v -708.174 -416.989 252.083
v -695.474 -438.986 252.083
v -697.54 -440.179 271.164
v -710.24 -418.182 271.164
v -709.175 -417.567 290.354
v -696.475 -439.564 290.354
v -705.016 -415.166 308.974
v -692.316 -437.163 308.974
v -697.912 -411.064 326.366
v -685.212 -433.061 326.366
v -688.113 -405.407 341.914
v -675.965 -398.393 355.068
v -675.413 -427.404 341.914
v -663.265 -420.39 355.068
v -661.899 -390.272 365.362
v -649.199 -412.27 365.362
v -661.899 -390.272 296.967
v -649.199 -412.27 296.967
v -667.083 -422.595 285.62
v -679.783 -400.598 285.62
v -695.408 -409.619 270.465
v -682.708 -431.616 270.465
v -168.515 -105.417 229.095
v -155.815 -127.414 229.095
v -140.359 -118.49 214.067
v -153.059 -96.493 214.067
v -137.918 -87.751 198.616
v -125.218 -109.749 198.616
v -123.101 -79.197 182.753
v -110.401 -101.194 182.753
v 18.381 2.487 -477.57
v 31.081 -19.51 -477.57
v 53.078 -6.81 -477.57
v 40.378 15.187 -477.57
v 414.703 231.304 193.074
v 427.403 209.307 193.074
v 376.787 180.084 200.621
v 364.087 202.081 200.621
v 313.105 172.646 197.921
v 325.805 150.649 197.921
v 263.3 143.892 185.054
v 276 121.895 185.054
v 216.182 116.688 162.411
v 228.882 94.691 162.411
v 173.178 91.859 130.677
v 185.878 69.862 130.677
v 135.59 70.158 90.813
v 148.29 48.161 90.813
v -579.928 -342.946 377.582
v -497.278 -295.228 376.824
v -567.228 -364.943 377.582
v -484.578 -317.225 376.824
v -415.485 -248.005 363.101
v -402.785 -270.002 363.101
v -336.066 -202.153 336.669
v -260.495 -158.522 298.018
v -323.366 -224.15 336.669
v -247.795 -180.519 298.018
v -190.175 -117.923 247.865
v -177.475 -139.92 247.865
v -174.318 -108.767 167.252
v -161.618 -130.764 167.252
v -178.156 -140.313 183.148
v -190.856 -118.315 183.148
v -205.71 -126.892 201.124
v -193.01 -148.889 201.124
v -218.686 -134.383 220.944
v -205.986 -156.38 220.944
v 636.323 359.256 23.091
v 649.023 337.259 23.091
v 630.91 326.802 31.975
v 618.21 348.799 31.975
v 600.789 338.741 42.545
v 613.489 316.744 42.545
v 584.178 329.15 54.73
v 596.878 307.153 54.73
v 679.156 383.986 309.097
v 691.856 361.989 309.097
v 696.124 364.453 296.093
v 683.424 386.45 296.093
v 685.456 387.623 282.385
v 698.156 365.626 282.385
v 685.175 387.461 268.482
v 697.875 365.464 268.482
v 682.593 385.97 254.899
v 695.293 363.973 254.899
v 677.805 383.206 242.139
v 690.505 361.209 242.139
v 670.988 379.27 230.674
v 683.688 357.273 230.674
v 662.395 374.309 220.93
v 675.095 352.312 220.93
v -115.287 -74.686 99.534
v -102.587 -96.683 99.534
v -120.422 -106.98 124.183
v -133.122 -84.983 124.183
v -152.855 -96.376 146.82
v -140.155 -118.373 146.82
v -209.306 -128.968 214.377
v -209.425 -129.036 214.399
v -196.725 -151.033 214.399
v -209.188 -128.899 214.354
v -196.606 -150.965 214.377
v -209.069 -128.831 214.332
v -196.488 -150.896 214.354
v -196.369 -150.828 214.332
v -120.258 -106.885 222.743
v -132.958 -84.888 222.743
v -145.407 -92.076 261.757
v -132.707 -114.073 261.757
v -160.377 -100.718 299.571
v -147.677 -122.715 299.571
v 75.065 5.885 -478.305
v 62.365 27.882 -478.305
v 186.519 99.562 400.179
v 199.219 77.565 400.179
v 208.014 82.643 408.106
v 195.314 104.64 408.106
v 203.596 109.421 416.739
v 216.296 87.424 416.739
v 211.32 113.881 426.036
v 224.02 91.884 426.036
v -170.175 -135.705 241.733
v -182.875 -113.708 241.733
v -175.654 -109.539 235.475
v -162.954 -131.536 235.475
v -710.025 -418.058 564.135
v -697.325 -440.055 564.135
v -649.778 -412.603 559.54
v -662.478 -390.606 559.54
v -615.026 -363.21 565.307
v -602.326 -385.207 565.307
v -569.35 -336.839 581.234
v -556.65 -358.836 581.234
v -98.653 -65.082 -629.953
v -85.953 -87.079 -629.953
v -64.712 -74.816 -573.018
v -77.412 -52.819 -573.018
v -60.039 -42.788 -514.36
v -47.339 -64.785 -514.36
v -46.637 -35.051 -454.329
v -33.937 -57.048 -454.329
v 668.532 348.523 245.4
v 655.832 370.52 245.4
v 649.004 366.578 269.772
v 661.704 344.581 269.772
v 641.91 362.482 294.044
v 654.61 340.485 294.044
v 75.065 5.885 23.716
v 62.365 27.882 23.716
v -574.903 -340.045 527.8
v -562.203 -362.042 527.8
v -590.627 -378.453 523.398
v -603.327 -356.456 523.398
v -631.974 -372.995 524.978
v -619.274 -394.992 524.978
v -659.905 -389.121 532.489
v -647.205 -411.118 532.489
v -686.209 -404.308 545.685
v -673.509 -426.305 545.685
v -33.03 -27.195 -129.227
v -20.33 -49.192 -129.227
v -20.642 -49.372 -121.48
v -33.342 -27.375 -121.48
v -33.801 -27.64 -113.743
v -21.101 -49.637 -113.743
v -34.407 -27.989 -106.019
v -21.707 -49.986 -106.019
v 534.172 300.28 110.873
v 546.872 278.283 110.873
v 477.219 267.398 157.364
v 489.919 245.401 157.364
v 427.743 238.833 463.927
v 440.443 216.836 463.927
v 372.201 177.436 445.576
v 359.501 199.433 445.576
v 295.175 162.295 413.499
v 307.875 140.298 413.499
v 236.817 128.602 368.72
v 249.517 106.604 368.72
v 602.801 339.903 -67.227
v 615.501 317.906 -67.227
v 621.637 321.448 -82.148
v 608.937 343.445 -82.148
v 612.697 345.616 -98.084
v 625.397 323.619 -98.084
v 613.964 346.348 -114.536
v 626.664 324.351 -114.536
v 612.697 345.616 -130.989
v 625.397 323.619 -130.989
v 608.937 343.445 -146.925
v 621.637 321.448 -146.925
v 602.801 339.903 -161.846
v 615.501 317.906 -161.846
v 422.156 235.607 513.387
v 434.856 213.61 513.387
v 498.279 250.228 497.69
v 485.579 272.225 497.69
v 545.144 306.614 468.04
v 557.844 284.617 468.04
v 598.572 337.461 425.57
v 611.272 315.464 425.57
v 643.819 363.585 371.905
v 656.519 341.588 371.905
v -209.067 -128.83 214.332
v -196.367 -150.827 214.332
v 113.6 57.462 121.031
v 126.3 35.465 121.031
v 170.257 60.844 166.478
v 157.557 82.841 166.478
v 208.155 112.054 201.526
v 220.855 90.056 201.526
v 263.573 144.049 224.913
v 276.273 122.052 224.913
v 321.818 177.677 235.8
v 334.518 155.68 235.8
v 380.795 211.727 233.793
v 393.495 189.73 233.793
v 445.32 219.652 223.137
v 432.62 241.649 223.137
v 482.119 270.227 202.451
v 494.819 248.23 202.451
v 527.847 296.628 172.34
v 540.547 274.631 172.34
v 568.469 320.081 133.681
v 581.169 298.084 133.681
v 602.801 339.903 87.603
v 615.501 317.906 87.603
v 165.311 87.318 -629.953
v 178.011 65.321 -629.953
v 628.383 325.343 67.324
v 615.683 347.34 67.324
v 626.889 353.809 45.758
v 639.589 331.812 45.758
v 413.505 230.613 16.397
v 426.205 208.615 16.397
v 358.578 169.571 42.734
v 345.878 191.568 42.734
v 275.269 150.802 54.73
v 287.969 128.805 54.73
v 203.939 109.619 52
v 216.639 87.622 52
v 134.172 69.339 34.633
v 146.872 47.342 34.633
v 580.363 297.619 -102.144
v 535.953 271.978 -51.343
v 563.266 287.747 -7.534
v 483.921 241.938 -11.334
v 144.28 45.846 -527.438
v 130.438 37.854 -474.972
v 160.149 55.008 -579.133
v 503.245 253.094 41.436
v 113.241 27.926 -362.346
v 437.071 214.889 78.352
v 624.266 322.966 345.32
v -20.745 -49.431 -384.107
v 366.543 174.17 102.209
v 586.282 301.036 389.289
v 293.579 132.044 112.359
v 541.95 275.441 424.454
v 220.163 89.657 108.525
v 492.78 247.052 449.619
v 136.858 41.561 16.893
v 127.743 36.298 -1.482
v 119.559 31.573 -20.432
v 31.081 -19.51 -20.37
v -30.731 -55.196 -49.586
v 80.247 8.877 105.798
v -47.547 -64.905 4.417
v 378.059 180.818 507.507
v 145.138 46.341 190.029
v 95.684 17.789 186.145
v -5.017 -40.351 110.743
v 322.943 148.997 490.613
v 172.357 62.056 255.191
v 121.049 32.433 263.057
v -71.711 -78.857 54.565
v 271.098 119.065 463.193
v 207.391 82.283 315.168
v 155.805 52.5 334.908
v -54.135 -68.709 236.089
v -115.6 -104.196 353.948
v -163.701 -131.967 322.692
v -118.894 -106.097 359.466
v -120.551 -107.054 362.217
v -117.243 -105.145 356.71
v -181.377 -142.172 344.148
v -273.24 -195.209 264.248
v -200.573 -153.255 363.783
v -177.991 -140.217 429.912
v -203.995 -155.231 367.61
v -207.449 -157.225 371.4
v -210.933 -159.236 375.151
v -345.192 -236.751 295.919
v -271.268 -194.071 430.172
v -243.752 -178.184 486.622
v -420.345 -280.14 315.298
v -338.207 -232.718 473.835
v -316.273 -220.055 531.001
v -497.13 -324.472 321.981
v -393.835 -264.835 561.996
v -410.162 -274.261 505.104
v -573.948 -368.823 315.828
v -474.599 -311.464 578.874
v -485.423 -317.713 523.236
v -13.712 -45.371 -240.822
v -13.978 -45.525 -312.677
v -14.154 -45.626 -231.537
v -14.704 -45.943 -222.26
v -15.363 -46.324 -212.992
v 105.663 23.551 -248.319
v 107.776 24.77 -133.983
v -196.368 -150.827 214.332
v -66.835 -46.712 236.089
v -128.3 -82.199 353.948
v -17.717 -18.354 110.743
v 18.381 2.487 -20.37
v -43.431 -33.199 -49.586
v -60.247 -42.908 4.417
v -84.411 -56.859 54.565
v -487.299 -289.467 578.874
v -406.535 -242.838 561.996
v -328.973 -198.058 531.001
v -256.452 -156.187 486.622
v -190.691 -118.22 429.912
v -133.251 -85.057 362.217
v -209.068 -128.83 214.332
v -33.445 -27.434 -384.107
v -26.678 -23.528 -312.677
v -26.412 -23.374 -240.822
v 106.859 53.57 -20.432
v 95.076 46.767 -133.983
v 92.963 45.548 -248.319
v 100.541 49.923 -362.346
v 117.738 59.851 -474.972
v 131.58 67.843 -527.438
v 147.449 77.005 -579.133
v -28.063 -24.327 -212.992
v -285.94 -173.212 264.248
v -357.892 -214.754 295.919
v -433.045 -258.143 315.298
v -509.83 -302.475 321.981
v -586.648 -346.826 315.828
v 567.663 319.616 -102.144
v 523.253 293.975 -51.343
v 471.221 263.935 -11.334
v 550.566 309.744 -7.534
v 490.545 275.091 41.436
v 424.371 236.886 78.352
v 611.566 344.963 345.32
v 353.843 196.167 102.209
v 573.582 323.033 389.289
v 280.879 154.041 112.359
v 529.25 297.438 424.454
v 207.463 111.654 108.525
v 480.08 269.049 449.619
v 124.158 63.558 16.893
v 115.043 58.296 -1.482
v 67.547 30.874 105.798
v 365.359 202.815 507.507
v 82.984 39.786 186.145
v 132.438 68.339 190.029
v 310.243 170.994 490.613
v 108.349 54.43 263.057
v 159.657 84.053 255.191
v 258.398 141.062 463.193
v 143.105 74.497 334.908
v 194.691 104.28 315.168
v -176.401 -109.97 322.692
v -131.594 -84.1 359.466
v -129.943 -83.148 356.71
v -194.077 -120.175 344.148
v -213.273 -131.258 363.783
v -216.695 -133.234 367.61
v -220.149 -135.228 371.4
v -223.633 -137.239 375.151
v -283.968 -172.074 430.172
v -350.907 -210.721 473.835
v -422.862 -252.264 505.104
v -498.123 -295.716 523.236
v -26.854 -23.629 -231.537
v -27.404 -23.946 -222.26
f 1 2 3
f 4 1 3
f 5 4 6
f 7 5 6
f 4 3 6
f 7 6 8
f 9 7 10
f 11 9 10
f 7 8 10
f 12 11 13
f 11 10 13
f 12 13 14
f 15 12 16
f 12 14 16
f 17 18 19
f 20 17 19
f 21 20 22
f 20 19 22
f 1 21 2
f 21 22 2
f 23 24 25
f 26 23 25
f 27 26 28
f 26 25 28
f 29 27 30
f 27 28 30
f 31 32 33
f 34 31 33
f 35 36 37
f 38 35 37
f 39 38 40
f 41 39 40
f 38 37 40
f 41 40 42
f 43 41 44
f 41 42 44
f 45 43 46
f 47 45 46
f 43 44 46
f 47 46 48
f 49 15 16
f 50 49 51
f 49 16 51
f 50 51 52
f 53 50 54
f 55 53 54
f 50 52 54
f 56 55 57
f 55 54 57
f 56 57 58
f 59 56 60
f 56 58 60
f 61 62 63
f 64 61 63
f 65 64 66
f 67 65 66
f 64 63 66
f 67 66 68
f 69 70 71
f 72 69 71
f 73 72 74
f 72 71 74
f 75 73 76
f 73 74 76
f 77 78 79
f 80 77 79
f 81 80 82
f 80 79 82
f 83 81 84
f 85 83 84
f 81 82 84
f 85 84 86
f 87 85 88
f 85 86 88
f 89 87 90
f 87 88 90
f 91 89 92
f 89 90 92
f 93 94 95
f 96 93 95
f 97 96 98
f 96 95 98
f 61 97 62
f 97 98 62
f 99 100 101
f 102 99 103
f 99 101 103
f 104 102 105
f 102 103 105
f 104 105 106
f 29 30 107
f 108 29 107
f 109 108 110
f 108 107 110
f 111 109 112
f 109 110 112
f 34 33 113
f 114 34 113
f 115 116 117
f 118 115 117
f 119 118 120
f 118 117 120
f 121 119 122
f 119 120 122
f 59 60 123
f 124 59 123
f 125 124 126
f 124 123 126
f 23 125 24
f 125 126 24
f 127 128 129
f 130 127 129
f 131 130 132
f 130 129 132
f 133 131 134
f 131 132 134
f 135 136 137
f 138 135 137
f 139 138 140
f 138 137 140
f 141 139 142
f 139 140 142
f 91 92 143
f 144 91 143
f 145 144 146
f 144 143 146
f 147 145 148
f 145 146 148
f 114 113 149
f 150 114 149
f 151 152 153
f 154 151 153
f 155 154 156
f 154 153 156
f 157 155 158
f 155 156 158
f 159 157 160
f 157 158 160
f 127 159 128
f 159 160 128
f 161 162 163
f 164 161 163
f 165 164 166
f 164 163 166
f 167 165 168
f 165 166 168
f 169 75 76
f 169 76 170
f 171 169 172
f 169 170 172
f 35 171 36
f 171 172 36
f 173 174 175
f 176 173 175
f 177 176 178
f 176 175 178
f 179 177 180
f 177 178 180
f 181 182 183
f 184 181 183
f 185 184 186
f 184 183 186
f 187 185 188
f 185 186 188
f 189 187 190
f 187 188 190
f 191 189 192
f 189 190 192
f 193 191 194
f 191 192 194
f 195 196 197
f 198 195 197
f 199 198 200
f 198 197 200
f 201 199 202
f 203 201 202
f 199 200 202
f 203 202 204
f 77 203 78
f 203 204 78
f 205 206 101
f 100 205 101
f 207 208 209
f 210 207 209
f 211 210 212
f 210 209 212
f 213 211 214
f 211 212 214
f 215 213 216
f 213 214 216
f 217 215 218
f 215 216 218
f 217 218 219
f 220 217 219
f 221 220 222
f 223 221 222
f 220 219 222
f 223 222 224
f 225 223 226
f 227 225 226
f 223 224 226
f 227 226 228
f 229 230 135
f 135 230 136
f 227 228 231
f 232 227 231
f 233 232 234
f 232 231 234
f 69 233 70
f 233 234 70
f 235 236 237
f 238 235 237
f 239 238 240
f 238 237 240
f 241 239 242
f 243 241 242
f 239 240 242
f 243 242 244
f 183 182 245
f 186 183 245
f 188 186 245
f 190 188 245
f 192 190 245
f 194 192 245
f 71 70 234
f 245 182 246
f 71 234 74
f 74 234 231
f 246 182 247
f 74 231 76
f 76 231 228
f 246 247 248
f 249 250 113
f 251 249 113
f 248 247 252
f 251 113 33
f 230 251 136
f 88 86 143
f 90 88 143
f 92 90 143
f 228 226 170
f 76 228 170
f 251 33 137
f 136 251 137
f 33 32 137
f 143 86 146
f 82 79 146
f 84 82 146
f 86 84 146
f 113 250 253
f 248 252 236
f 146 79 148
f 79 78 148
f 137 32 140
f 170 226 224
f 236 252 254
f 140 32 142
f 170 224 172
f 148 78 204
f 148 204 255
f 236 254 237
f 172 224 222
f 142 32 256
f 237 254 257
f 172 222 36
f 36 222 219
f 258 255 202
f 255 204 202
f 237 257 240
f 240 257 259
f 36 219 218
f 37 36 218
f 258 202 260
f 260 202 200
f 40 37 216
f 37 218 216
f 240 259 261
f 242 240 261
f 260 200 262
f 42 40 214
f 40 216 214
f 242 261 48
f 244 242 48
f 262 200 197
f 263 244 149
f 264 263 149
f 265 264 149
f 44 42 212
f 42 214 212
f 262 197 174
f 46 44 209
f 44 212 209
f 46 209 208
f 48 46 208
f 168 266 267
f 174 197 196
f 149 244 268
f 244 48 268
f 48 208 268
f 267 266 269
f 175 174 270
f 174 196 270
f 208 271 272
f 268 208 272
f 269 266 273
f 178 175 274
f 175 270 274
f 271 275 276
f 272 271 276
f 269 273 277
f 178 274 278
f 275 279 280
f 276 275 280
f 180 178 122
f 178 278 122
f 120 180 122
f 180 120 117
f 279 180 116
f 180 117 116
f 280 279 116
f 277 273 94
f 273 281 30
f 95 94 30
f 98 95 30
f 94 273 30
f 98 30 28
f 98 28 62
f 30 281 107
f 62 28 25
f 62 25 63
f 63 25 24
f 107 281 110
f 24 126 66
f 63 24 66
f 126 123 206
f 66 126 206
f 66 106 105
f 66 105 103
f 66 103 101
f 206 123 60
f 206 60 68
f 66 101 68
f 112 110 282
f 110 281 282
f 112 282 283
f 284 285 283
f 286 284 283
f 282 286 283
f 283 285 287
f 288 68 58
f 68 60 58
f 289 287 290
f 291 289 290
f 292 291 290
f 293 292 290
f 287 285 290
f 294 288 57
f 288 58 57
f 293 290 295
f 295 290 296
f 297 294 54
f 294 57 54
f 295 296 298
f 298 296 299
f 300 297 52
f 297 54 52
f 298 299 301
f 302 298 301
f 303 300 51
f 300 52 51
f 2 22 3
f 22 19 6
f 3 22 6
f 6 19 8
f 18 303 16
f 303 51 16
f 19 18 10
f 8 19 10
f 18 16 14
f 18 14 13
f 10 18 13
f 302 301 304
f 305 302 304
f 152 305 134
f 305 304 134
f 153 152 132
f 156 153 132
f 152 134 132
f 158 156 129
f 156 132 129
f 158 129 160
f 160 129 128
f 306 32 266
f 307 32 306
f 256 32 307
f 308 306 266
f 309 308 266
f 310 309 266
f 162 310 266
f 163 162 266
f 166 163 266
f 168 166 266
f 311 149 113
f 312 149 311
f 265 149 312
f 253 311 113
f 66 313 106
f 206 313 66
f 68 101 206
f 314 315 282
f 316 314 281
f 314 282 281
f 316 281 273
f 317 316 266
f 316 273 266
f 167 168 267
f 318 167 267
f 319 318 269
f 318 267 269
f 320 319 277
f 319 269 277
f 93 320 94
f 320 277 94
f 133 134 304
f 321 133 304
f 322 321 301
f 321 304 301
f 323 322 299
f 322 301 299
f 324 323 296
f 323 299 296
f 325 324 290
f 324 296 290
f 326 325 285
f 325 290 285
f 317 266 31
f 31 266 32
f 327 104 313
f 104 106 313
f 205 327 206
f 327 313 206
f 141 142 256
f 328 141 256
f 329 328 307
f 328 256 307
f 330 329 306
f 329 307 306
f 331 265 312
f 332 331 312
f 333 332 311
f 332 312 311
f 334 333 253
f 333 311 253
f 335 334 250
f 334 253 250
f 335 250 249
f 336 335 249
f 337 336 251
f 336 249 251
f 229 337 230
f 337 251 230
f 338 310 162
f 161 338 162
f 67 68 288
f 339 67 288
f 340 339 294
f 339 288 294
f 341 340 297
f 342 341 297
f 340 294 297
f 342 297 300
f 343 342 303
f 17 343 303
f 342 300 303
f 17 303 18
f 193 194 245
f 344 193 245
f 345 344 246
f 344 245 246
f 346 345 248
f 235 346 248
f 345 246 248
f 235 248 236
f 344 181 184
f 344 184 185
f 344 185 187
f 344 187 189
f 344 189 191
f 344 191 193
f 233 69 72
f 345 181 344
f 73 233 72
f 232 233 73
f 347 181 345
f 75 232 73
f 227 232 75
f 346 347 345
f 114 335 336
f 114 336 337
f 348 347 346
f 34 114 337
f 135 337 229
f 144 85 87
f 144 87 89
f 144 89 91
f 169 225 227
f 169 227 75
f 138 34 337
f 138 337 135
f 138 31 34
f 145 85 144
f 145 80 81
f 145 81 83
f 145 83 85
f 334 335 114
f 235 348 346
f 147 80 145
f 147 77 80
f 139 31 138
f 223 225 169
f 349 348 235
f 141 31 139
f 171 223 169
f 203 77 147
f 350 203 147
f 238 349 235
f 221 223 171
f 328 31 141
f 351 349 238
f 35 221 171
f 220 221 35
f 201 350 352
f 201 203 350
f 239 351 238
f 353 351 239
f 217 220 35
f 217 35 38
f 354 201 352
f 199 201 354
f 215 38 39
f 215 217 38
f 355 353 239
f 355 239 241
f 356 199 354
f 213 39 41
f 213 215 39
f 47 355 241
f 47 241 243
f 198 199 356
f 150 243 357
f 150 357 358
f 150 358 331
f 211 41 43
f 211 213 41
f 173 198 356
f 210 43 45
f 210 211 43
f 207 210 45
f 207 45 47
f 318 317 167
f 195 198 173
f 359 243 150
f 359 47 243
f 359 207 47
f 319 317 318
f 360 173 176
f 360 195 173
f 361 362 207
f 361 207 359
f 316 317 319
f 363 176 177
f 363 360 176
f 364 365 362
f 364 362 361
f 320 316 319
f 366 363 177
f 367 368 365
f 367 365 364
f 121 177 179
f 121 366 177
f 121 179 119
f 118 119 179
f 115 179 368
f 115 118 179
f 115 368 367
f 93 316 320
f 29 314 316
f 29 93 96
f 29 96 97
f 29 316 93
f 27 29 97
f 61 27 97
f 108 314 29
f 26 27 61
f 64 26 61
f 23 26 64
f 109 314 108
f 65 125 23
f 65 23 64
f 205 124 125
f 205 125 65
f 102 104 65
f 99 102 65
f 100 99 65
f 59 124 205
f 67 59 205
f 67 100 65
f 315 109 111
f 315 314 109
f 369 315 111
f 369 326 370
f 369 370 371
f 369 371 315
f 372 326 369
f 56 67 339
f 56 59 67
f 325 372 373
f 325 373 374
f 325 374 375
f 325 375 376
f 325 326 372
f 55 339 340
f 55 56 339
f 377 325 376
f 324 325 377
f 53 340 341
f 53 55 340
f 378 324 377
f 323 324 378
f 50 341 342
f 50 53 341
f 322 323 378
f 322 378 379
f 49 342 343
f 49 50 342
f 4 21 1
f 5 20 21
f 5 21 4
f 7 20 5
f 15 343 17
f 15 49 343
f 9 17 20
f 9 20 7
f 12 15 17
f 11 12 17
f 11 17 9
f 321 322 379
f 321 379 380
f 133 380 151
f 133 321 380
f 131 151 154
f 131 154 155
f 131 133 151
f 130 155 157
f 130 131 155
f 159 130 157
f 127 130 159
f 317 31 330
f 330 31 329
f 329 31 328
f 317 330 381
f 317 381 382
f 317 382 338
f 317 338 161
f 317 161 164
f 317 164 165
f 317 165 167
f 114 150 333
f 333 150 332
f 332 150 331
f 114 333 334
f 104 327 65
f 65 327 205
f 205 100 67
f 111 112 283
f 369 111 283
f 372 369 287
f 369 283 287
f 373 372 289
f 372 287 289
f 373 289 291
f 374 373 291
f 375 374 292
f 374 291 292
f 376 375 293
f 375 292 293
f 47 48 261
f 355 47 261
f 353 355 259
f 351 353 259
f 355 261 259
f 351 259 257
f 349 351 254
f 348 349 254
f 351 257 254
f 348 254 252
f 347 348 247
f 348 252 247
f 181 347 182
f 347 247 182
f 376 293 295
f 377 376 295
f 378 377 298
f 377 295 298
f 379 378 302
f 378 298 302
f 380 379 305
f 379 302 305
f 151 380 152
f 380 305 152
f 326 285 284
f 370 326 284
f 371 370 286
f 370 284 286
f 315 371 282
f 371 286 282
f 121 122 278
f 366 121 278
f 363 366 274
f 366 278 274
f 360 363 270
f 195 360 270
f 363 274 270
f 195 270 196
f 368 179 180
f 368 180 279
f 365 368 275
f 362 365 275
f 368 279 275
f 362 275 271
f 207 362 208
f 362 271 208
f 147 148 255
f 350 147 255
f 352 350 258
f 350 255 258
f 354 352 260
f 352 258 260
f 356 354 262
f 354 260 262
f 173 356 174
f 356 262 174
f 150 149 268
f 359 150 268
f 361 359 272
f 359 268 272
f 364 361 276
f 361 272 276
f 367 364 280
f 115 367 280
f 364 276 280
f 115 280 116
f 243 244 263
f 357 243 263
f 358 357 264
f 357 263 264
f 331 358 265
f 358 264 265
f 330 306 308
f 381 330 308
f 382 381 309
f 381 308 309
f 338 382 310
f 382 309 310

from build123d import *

# Parameters (mm, degrees)
F1_DEPTH = 25.4
F2_ANGLE = 240
F3_ANGLE = 30


# Not quite as in the source:
# - a feature names something its author has since deleted; it is built from what else it names


with BuildPart() as f1:
    # F0 (on Front) → F1 (new body)
    with BuildSketch(Plane.XZ):
        with BuildLine():
            ThreePointArc((250.1826790571, 167.252155113), (278.1130880831, 191.8897284489), (301.4146556953, 220.9440691755))
            ThreePointArc((301.4146556953, 220.9440691755), (548.9344062192, 315.2980350064), (813.1931424143, 296.9672381879))
            ThreePointArc((813.1931424143, 296.9672381879), (843.2368199295, 278.4857074323), (866.6267395021, 252.0830333234))
            ThreePointArc((866.6267395021, 252.0830333234), (859.2886133314, 317.8635284318), (813.1931424141, 365.3622567654))
            ThreePointArc((813.1931424141, 365.3622567654), (528.658381188, 363.1008503302), (268.4933890423, 247.8649133709))
            ThreePointArc((268.4933890423, 247.8649133709), (255.8828799715, 238.6195077853), (243.4818595648, 229.0949523449))
            ThreePointArc((243.4818595648, 229.0949523449), (216.8466348082, 206.3937348312), (191.0419305212, 182.7527172748))
            ThreePointArc((191.0419305212, 182.7527172748), (209.2426753746, 242.3856524278), (234.085008502, 299.5714247227))
            ThreePointArc((234.085008502, 299.5714247227), (262.5639500876, 333.6377098113), (295.1646447182, 363.7832999229))
            ThreePointArc((295.1646447182, 363.7832999229), (301.1050415282, 369.5098935095), (307.1268496022, 375.1508168282))
            ThreePointArc((307.1268496022, 375.1508168282), (495.0303186662, 491.0726231916), (712.7380371094, 527.8003811836))
            ThreePointArc((712.7380371094, 527.8003811836), (794.9345928524, 528.0032351591), (868.764102459, 564.1351938248))
            ThreePointArc((868.764102459, 564.1351938248), (786.3289991041, 561.1323579191), (706.3259482384, 581.2339782715))
            ThreePointArc((706.3259482384, 581.2339782715), (428.7633374116, 531.0006025963), (202.7621120214, 362.2171878815))
            ThreePointArc((202.7621120214, 362.2171878815), (199.8950650536, 358.0887688295), (197.0456982791, 353.9481274337))
            ThreePointArc((197.0456982791, 353.9481274337), (95.8778868485, 174.2465451031), (27.6736820157, -20.3704408073))
            Line((27.6736820157, -20.3704408073), (27.6736820157, -477.5704408073))
            Line((27.6736820157, -477.5704408073), (2.2736820157, -477.5704408073))
            Line((2.2736820157, -477.5704408073), (-23.1156889348, -478.3051807189))
            Line((-23.1156889348, -478.3051807189), (-23.1156889348, -20.3704408073))
            Line((-23.1156889348, -20.3704408073), (-23.1156889348, 23.7159409966))
            ThreePointArc((-23.1156889348, 23.7159409966), (-60.1684665025, 225.1338478784), (-166.475340724, 400.1793563366))
            ThreePointArc((-166.475340724, 400.1793563366), (-181.4907758471, 412.3365760313), (-195.1139737362, 426.0358373953))
            ThreePointArc((-195.1139737362, 426.0358373953), (-309.3402704075, 490.6134334), (-438.5659396648, 513.3870840073))
            ThreePointArc((-438.5659396648, 513.3870840073), (-612.4676441027, 448.3168030455), (-735.3243231773, 309.0969026089))
            ThreePointArc((-735.3243231773, 309.0969026089), (-741.1111301221, 261.6187426822), (-715.9704566002, 220.9295630455))
            ThreePointArc((-715.9704566002, 220.9295630455), (-704.4880158315, 257.5983242076), (-692.3158168793, 294.0439283848))
            ThreePointArc((-692.3158168793, 294.0439283848), (-588.6352200974, 408.0539998704), (-445.0172185898, 463.9273583889))
            ThreePointArc((-445.0172185898, 463.9273583889), (-328.3620257934, 431.1988717022), (-224.5548516512, 368.7196075916))
            ThreePointArc((-224.5548516512, 368.7196075916), (-135.4578046593, 255.1906523593), (-82.276083529, 121.0310012102))
            ThreePointArc((-82.276083529, 121.0310012102), (-222.8986090653, 214.7399937609), (-390.8064365387, 233.7933778763))
            ThreePointArc((-390.8064365387, 233.7933778763), (-534.8506307826, 188.5252288055), (-647.1569538116, 87.6033529639))
            ThreePointArc((-647.1569538116, 87.6033529639), (-668.750342933, 56.6907627964), (-685.8645677567, 23.0906736106))
            ThreePointArc((-685.8645677567, 23.0906736106), (-654.782784529, 37.0530177531), (-625.6527304649, 54.7296761702))
            ThreePointArc((-625.6527304649, 54.7296761702), (-535.9364621749, 135.4019490396), (-429.9600422382, 193.0736303329))
            ThreePointArc((-429.9600422382, 193.0736303329), (-255.1353162114, 185.0540353391), (-107.6677426965, 90.8133143325))
            ThreePointArc((-107.6677426965, 90.8133143325), (-400.8973120765, 91.9617638291), (-647.1569538116, -67.2270804644))
            ThreePointArc((-647.1569538116, -67.2270804644), (-660.0470579155, -114.5363822579), (-647.1569538116, -161.8456840515))
            ThreePointArc((-647.1569538116, -161.8456840515), (-555.302299834, -51.3433620353), (-428.5768360003, 16.3965630051))
            ThreePointArc((-428.5768360003, 16.3965630051), (-268.955549485, 54.7296761702), (-106.0306501957, 34.633411211))
            ThreePointArc((-106.0306501957, 34.633411211), (-89.072951708, 7.7811719553), (-74.492260997, -20.4324727833))
            ThreePointArc((-74.492260997, -20.4324727833), (-58.44709094, -248.3192131796), (-87.0539037033, -474.9719523956))
            ThreePointArc((-87.0539037033, -474.9719523956), (-111.9092602944, -553.3883298655), (-141.9875799101, -629.9534113053))
            Line((-141.9875799101, -629.9534113053), (162.8124200899, -629.9534113053))
            ThreePointArc((162.8124200899, -629.9534113053), (127.6888612329, -543.8827728043), (102.7497877256, -454.3290916329))
            ThreePointArc((102.7497877256, -454.3290916329), (82.6750571268, -348.4939128162), (79.3961640974, -240.8215916548))
            ThreePointArc((79.3961640974, -240.8215916548), (80.2077016296, -226.8972481017), (81.3018441543, -212.9922565991))
            Line((81.3018441543, -212.9922565991), (87.0378738701, -129.2269402374))
            ThreePointArc((87.0378738701, -129.2269402374), (87.6414479673, -117.6100786674), (88.6270669795, -106.0193785337))
            ThreePointArc((88.6270669795, -106.0193785337), (118.4644160965, 4.4171939804), (182.0192138426, 99.534446014))
            ThreePointArc((182.0192138426, 99.534446014), (213.7444570986, 135.7653016553), (250.1826790571, 167.252155113))
        make_face()
        with BuildLine():
            ThreePointArc((290.310142009, 214.3317525479), (290.308974312, 214.3316774306), (290.3078066153, 214.3316023092))
            Line((290.3078066153, 214.3316023092), (290.7207294437, 214.3993956711))
            ThreePointArc((290.7207294437, 214.3993956711), (290.5154263752, 214.3656308704), (290.310142009, 214.3317525479))
        make_face(mode=Mode.SUBTRACT)
    extrude(amount=F1_DEPTH)


with BuildPart() as f1_1:
    # F2: moved
    add(f1.part.rotate(Axis((27.6736820157, -25.4, -248.9704408073), (0, 0, 1)), F2_ANGLE))


with BuildPart() as f1_2:
    # F3: moved
    add(f1_1.part.rotate(Axis((75.0654127471, 5.8848854854, -227.2946198611), (0, 0, -1)), F3_ANGLE))


solid = f1_2.part
